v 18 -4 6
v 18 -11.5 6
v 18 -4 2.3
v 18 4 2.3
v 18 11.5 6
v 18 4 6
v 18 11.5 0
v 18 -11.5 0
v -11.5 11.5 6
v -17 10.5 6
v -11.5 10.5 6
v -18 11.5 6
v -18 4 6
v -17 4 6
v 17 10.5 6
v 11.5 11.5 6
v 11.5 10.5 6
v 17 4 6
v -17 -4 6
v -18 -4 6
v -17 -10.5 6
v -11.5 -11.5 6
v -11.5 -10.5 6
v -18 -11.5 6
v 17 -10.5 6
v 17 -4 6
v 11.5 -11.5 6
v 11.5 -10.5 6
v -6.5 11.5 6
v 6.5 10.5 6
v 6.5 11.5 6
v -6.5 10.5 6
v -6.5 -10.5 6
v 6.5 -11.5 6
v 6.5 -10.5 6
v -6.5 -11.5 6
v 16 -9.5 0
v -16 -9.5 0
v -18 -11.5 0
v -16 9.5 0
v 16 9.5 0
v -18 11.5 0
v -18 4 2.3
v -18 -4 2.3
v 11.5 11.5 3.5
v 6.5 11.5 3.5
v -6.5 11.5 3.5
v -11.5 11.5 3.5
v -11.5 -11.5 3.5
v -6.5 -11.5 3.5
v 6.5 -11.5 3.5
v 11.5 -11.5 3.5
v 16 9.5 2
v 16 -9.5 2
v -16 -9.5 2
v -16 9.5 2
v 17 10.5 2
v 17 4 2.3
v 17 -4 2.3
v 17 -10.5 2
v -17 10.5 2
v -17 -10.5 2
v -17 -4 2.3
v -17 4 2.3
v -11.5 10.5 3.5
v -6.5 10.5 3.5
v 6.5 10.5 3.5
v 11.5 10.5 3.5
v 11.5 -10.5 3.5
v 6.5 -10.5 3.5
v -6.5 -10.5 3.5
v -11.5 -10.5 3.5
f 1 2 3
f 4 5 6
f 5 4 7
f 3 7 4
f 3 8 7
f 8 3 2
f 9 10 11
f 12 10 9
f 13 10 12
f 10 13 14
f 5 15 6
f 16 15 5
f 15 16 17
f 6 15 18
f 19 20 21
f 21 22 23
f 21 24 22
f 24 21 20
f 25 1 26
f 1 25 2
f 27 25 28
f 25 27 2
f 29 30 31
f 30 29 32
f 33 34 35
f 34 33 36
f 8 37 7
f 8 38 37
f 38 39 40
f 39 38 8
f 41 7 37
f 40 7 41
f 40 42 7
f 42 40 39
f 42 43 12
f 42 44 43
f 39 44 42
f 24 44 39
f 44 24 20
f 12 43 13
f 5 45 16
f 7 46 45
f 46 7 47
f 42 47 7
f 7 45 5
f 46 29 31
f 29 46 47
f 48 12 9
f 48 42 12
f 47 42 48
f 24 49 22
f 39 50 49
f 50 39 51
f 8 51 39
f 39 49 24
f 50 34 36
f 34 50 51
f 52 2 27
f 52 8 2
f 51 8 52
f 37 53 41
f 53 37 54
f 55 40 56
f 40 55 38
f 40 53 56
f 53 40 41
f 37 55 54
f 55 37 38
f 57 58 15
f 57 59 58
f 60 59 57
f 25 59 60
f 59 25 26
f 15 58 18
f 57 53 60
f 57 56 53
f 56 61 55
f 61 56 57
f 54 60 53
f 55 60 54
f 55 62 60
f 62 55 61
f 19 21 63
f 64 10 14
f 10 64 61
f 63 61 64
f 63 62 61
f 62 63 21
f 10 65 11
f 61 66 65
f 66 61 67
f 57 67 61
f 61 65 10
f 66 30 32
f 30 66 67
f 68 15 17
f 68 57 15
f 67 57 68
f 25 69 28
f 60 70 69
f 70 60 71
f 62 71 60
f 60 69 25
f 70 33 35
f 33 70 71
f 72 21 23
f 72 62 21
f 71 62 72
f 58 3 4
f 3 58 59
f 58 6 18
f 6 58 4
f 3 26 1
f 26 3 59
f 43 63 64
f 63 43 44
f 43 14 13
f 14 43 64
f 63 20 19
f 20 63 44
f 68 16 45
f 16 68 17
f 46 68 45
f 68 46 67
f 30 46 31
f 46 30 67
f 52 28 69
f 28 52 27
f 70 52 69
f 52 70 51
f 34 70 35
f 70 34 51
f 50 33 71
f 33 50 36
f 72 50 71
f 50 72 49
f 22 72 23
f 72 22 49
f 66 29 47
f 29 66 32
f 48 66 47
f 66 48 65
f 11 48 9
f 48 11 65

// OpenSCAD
inner_width=21;
inner_length=34;

outer_length=inner_length+2;
outer_width=inner_width+2;
support_length=inner_length-2;
support_width=inner_width-2;
under=2;
over=4;
height=under+over;
magnet_dia=8;
kappe=4;
edge=3;

translate([0,0,(height)/2]){
  difference() { 
    cube([outer_length,outer_width,height],center=true);
    cube([support_length,support_width,height],center=true);
//          cube([inner_length,inner_width,height],center=true);
    translate([0,0,under]) {
      cube([inner_length,inner_width,height],center=true);

    }
    translate([inner_length/2,0,1.8]) {
      cube([5,8,5],center=true);

    }
    translate([-inner_length/2,0,1.8]) {
      cube([5,8,5],center=true);

    }
    translate([inner_length/2-8,inner_width/2,2.5]) {
      cube([5,4,4],center=true);

    }
     translate([inner_length/2-8,-inner_width/2,2.5]) {
      cube([5,4,4],center=true);

    }
     translate([-inner_length/2+8,-inner_width/2,2.5]) {
      cube([5,4,4],center=true);

    }
     translate([-inner_length/2+8,inner_width/2,2.5]) {
      cube([5,4,4],center=true);

    }
 }
 }
